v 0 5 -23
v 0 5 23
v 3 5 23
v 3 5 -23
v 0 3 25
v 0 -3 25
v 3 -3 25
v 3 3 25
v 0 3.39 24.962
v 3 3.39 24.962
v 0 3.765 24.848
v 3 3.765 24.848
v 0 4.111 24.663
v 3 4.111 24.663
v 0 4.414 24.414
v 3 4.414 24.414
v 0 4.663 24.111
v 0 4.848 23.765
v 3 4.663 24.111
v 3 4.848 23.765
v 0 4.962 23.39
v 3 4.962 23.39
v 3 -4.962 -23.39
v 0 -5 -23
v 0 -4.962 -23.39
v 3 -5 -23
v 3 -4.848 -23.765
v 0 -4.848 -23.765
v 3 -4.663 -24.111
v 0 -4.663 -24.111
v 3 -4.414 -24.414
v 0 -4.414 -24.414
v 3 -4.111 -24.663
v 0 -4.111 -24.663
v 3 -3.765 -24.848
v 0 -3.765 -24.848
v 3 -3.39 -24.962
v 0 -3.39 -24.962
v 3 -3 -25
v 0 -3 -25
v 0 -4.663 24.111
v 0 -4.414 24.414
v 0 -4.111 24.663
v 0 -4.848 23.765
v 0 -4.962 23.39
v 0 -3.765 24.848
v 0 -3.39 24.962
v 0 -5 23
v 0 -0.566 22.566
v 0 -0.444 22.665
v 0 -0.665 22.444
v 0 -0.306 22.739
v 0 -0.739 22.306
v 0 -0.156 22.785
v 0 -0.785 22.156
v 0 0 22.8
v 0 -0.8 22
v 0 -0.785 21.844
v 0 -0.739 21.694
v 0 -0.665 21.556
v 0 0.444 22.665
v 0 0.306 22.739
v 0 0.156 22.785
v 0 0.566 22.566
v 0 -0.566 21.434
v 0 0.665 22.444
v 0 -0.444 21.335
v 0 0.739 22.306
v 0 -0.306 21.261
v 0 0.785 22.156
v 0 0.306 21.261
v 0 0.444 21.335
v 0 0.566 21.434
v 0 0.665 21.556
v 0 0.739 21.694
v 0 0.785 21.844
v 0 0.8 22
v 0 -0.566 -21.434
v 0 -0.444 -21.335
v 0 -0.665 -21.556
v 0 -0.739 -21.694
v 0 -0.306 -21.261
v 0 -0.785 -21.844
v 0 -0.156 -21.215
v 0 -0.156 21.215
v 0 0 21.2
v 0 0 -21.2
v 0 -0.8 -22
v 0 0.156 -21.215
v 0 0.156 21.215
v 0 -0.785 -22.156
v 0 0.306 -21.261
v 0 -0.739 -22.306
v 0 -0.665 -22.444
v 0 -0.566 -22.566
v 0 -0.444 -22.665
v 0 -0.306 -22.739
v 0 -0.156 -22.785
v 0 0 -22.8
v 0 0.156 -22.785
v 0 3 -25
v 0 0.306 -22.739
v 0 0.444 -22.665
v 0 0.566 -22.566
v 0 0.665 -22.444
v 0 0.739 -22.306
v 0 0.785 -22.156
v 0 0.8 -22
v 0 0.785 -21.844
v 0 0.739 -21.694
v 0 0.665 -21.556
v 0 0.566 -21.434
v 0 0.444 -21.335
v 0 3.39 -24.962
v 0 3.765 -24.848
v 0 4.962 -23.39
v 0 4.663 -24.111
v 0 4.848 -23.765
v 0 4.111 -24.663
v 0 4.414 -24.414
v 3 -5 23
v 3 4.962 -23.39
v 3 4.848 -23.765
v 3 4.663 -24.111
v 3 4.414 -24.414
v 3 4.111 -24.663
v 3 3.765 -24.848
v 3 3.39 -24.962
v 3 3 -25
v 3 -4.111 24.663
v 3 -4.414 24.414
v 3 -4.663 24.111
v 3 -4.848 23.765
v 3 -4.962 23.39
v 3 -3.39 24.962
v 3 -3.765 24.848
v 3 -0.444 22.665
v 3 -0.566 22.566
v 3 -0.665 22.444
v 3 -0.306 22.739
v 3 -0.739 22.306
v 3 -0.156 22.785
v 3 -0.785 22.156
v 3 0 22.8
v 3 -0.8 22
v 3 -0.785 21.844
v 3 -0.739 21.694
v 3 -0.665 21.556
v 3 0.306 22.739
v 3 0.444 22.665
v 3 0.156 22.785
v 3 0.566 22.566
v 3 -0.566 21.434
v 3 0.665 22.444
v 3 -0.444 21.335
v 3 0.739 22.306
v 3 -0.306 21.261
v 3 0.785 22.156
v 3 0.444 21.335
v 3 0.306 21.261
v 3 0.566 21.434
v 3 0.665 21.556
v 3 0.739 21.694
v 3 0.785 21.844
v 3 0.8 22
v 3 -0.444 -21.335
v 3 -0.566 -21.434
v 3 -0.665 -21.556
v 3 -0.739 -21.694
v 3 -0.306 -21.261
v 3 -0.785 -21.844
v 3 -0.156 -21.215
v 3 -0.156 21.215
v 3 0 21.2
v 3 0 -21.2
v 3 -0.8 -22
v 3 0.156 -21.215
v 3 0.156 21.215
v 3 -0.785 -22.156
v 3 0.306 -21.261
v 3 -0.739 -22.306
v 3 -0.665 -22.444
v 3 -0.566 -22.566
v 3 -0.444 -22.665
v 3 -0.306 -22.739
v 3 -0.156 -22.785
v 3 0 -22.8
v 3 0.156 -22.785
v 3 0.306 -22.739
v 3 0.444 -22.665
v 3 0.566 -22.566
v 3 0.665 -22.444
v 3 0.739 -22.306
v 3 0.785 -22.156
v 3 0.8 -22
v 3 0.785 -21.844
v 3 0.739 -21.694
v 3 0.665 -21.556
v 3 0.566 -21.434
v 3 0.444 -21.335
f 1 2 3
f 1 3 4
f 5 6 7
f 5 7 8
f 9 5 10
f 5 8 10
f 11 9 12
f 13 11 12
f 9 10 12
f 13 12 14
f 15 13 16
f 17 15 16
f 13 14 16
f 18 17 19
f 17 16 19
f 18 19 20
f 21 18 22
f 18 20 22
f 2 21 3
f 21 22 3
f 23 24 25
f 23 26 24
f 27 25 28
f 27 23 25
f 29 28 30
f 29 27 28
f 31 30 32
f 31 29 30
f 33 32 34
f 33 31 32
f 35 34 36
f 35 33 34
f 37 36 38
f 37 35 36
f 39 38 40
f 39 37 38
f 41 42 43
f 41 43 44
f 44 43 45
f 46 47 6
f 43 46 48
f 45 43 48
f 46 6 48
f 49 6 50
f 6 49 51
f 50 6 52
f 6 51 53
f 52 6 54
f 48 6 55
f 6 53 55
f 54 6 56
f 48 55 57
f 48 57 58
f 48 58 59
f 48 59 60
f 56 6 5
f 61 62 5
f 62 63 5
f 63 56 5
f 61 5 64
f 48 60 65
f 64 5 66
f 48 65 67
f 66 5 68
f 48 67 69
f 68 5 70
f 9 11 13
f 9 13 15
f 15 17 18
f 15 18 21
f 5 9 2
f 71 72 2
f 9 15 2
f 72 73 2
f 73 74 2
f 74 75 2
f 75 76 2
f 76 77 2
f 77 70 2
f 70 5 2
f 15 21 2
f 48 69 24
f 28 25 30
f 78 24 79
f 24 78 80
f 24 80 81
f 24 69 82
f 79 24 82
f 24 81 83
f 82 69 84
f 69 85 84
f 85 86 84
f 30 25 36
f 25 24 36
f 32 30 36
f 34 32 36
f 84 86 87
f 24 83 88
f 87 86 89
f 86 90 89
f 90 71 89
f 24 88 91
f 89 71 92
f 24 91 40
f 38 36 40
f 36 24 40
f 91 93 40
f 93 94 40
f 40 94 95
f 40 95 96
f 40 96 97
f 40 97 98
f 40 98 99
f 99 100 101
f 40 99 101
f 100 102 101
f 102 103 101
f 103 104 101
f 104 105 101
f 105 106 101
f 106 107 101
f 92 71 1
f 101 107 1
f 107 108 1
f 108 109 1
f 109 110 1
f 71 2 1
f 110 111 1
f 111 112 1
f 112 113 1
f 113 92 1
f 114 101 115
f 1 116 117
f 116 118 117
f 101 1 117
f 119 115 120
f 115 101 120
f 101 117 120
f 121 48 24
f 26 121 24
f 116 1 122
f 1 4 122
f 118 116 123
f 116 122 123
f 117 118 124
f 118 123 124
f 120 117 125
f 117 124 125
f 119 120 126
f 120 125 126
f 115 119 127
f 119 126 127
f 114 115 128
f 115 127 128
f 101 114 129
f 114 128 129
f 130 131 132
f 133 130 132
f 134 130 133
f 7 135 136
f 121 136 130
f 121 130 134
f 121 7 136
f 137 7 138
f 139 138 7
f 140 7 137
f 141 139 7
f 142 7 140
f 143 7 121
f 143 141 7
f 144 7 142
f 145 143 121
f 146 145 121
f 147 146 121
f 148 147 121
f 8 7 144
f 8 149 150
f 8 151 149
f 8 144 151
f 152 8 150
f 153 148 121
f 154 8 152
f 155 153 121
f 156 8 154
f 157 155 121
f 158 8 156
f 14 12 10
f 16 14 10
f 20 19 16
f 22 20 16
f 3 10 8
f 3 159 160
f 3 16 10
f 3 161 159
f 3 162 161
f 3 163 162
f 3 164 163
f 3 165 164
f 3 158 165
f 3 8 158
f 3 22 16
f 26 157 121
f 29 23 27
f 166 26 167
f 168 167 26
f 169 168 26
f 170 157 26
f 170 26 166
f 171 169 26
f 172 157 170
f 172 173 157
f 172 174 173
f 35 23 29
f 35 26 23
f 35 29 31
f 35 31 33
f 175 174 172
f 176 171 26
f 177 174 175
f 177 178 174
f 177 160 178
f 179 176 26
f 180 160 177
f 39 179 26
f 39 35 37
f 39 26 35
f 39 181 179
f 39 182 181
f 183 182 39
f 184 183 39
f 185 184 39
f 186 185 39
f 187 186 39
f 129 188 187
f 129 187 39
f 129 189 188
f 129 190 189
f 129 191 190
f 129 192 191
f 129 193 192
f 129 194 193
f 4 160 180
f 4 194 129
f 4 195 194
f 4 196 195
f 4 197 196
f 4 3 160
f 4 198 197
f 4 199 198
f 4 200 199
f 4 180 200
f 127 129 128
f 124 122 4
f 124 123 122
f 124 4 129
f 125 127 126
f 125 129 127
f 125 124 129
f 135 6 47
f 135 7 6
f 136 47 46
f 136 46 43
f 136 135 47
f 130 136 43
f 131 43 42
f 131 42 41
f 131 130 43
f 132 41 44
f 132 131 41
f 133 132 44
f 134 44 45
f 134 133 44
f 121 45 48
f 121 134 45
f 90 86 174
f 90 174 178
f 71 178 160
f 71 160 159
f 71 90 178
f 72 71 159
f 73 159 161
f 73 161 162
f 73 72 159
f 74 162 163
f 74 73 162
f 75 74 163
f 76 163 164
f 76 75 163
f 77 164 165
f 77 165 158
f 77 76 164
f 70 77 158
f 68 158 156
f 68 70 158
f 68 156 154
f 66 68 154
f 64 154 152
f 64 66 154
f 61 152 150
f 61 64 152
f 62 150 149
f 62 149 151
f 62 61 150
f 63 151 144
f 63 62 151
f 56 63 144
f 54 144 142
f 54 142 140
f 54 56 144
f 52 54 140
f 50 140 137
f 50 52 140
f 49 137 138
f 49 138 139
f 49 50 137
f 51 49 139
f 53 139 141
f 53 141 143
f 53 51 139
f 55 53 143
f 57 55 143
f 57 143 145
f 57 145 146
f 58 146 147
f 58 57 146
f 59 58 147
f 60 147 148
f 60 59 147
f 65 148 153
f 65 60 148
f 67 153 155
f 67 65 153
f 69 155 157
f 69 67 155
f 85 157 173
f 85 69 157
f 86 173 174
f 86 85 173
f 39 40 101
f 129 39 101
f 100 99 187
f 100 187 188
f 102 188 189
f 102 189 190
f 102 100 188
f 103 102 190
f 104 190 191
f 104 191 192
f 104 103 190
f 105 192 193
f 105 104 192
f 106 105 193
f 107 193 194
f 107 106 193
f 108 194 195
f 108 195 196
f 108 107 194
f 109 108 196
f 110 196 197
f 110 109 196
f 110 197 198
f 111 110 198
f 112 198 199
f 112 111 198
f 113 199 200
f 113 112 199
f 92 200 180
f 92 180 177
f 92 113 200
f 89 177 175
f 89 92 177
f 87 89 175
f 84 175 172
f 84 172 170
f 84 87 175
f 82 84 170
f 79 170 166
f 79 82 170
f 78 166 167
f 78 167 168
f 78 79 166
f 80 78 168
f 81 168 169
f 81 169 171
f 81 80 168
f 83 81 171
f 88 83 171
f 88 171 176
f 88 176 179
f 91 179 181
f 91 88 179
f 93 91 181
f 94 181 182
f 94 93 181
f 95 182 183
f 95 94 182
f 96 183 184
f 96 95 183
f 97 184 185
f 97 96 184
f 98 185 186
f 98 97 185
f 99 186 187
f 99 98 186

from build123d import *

# Parameters (mm, degrees)
ESBO_O1_W                = 50
ESBO_O1_H                = 10
ESBO_O1_R                = 0.8
RESSALTO_EXTRUS_O1_DEPTH = 3
FILETE1_R                = 2


with BuildPart() as part:
    # Esboço1 → Ressalto-extrusão1 (new body)
    with BuildSketch(Plane(origin=(0, 0, 0), x_dir=(0, 0, -1), z_dir=(1, 0, 0))):
        Rectangle(ESBO_O1_W, ESBO_O1_H)
        with Locations((-22, 0)):
            Circle(ESBO_O1_R, mode=Mode.SUBTRACT)
        with Locations((22, 0)):
            Circle(ESBO_O1_R, mode=Mode.SUBTRACT)
    extrude(amount=RESSALTO_EXTRUS_O1_DEPTH)

    # Filete1
    filete1_edges = [part.edges().sort_by_distance(p)[0] for p in [
        (1.5, -5, -25),
        (1.5, -5, 25),
        (1.5, 5, 25),
        (1.5, 5, -25),
    ]]
    fillet(filete1_edges, radius=FILETE1_R)


solid = part.part
